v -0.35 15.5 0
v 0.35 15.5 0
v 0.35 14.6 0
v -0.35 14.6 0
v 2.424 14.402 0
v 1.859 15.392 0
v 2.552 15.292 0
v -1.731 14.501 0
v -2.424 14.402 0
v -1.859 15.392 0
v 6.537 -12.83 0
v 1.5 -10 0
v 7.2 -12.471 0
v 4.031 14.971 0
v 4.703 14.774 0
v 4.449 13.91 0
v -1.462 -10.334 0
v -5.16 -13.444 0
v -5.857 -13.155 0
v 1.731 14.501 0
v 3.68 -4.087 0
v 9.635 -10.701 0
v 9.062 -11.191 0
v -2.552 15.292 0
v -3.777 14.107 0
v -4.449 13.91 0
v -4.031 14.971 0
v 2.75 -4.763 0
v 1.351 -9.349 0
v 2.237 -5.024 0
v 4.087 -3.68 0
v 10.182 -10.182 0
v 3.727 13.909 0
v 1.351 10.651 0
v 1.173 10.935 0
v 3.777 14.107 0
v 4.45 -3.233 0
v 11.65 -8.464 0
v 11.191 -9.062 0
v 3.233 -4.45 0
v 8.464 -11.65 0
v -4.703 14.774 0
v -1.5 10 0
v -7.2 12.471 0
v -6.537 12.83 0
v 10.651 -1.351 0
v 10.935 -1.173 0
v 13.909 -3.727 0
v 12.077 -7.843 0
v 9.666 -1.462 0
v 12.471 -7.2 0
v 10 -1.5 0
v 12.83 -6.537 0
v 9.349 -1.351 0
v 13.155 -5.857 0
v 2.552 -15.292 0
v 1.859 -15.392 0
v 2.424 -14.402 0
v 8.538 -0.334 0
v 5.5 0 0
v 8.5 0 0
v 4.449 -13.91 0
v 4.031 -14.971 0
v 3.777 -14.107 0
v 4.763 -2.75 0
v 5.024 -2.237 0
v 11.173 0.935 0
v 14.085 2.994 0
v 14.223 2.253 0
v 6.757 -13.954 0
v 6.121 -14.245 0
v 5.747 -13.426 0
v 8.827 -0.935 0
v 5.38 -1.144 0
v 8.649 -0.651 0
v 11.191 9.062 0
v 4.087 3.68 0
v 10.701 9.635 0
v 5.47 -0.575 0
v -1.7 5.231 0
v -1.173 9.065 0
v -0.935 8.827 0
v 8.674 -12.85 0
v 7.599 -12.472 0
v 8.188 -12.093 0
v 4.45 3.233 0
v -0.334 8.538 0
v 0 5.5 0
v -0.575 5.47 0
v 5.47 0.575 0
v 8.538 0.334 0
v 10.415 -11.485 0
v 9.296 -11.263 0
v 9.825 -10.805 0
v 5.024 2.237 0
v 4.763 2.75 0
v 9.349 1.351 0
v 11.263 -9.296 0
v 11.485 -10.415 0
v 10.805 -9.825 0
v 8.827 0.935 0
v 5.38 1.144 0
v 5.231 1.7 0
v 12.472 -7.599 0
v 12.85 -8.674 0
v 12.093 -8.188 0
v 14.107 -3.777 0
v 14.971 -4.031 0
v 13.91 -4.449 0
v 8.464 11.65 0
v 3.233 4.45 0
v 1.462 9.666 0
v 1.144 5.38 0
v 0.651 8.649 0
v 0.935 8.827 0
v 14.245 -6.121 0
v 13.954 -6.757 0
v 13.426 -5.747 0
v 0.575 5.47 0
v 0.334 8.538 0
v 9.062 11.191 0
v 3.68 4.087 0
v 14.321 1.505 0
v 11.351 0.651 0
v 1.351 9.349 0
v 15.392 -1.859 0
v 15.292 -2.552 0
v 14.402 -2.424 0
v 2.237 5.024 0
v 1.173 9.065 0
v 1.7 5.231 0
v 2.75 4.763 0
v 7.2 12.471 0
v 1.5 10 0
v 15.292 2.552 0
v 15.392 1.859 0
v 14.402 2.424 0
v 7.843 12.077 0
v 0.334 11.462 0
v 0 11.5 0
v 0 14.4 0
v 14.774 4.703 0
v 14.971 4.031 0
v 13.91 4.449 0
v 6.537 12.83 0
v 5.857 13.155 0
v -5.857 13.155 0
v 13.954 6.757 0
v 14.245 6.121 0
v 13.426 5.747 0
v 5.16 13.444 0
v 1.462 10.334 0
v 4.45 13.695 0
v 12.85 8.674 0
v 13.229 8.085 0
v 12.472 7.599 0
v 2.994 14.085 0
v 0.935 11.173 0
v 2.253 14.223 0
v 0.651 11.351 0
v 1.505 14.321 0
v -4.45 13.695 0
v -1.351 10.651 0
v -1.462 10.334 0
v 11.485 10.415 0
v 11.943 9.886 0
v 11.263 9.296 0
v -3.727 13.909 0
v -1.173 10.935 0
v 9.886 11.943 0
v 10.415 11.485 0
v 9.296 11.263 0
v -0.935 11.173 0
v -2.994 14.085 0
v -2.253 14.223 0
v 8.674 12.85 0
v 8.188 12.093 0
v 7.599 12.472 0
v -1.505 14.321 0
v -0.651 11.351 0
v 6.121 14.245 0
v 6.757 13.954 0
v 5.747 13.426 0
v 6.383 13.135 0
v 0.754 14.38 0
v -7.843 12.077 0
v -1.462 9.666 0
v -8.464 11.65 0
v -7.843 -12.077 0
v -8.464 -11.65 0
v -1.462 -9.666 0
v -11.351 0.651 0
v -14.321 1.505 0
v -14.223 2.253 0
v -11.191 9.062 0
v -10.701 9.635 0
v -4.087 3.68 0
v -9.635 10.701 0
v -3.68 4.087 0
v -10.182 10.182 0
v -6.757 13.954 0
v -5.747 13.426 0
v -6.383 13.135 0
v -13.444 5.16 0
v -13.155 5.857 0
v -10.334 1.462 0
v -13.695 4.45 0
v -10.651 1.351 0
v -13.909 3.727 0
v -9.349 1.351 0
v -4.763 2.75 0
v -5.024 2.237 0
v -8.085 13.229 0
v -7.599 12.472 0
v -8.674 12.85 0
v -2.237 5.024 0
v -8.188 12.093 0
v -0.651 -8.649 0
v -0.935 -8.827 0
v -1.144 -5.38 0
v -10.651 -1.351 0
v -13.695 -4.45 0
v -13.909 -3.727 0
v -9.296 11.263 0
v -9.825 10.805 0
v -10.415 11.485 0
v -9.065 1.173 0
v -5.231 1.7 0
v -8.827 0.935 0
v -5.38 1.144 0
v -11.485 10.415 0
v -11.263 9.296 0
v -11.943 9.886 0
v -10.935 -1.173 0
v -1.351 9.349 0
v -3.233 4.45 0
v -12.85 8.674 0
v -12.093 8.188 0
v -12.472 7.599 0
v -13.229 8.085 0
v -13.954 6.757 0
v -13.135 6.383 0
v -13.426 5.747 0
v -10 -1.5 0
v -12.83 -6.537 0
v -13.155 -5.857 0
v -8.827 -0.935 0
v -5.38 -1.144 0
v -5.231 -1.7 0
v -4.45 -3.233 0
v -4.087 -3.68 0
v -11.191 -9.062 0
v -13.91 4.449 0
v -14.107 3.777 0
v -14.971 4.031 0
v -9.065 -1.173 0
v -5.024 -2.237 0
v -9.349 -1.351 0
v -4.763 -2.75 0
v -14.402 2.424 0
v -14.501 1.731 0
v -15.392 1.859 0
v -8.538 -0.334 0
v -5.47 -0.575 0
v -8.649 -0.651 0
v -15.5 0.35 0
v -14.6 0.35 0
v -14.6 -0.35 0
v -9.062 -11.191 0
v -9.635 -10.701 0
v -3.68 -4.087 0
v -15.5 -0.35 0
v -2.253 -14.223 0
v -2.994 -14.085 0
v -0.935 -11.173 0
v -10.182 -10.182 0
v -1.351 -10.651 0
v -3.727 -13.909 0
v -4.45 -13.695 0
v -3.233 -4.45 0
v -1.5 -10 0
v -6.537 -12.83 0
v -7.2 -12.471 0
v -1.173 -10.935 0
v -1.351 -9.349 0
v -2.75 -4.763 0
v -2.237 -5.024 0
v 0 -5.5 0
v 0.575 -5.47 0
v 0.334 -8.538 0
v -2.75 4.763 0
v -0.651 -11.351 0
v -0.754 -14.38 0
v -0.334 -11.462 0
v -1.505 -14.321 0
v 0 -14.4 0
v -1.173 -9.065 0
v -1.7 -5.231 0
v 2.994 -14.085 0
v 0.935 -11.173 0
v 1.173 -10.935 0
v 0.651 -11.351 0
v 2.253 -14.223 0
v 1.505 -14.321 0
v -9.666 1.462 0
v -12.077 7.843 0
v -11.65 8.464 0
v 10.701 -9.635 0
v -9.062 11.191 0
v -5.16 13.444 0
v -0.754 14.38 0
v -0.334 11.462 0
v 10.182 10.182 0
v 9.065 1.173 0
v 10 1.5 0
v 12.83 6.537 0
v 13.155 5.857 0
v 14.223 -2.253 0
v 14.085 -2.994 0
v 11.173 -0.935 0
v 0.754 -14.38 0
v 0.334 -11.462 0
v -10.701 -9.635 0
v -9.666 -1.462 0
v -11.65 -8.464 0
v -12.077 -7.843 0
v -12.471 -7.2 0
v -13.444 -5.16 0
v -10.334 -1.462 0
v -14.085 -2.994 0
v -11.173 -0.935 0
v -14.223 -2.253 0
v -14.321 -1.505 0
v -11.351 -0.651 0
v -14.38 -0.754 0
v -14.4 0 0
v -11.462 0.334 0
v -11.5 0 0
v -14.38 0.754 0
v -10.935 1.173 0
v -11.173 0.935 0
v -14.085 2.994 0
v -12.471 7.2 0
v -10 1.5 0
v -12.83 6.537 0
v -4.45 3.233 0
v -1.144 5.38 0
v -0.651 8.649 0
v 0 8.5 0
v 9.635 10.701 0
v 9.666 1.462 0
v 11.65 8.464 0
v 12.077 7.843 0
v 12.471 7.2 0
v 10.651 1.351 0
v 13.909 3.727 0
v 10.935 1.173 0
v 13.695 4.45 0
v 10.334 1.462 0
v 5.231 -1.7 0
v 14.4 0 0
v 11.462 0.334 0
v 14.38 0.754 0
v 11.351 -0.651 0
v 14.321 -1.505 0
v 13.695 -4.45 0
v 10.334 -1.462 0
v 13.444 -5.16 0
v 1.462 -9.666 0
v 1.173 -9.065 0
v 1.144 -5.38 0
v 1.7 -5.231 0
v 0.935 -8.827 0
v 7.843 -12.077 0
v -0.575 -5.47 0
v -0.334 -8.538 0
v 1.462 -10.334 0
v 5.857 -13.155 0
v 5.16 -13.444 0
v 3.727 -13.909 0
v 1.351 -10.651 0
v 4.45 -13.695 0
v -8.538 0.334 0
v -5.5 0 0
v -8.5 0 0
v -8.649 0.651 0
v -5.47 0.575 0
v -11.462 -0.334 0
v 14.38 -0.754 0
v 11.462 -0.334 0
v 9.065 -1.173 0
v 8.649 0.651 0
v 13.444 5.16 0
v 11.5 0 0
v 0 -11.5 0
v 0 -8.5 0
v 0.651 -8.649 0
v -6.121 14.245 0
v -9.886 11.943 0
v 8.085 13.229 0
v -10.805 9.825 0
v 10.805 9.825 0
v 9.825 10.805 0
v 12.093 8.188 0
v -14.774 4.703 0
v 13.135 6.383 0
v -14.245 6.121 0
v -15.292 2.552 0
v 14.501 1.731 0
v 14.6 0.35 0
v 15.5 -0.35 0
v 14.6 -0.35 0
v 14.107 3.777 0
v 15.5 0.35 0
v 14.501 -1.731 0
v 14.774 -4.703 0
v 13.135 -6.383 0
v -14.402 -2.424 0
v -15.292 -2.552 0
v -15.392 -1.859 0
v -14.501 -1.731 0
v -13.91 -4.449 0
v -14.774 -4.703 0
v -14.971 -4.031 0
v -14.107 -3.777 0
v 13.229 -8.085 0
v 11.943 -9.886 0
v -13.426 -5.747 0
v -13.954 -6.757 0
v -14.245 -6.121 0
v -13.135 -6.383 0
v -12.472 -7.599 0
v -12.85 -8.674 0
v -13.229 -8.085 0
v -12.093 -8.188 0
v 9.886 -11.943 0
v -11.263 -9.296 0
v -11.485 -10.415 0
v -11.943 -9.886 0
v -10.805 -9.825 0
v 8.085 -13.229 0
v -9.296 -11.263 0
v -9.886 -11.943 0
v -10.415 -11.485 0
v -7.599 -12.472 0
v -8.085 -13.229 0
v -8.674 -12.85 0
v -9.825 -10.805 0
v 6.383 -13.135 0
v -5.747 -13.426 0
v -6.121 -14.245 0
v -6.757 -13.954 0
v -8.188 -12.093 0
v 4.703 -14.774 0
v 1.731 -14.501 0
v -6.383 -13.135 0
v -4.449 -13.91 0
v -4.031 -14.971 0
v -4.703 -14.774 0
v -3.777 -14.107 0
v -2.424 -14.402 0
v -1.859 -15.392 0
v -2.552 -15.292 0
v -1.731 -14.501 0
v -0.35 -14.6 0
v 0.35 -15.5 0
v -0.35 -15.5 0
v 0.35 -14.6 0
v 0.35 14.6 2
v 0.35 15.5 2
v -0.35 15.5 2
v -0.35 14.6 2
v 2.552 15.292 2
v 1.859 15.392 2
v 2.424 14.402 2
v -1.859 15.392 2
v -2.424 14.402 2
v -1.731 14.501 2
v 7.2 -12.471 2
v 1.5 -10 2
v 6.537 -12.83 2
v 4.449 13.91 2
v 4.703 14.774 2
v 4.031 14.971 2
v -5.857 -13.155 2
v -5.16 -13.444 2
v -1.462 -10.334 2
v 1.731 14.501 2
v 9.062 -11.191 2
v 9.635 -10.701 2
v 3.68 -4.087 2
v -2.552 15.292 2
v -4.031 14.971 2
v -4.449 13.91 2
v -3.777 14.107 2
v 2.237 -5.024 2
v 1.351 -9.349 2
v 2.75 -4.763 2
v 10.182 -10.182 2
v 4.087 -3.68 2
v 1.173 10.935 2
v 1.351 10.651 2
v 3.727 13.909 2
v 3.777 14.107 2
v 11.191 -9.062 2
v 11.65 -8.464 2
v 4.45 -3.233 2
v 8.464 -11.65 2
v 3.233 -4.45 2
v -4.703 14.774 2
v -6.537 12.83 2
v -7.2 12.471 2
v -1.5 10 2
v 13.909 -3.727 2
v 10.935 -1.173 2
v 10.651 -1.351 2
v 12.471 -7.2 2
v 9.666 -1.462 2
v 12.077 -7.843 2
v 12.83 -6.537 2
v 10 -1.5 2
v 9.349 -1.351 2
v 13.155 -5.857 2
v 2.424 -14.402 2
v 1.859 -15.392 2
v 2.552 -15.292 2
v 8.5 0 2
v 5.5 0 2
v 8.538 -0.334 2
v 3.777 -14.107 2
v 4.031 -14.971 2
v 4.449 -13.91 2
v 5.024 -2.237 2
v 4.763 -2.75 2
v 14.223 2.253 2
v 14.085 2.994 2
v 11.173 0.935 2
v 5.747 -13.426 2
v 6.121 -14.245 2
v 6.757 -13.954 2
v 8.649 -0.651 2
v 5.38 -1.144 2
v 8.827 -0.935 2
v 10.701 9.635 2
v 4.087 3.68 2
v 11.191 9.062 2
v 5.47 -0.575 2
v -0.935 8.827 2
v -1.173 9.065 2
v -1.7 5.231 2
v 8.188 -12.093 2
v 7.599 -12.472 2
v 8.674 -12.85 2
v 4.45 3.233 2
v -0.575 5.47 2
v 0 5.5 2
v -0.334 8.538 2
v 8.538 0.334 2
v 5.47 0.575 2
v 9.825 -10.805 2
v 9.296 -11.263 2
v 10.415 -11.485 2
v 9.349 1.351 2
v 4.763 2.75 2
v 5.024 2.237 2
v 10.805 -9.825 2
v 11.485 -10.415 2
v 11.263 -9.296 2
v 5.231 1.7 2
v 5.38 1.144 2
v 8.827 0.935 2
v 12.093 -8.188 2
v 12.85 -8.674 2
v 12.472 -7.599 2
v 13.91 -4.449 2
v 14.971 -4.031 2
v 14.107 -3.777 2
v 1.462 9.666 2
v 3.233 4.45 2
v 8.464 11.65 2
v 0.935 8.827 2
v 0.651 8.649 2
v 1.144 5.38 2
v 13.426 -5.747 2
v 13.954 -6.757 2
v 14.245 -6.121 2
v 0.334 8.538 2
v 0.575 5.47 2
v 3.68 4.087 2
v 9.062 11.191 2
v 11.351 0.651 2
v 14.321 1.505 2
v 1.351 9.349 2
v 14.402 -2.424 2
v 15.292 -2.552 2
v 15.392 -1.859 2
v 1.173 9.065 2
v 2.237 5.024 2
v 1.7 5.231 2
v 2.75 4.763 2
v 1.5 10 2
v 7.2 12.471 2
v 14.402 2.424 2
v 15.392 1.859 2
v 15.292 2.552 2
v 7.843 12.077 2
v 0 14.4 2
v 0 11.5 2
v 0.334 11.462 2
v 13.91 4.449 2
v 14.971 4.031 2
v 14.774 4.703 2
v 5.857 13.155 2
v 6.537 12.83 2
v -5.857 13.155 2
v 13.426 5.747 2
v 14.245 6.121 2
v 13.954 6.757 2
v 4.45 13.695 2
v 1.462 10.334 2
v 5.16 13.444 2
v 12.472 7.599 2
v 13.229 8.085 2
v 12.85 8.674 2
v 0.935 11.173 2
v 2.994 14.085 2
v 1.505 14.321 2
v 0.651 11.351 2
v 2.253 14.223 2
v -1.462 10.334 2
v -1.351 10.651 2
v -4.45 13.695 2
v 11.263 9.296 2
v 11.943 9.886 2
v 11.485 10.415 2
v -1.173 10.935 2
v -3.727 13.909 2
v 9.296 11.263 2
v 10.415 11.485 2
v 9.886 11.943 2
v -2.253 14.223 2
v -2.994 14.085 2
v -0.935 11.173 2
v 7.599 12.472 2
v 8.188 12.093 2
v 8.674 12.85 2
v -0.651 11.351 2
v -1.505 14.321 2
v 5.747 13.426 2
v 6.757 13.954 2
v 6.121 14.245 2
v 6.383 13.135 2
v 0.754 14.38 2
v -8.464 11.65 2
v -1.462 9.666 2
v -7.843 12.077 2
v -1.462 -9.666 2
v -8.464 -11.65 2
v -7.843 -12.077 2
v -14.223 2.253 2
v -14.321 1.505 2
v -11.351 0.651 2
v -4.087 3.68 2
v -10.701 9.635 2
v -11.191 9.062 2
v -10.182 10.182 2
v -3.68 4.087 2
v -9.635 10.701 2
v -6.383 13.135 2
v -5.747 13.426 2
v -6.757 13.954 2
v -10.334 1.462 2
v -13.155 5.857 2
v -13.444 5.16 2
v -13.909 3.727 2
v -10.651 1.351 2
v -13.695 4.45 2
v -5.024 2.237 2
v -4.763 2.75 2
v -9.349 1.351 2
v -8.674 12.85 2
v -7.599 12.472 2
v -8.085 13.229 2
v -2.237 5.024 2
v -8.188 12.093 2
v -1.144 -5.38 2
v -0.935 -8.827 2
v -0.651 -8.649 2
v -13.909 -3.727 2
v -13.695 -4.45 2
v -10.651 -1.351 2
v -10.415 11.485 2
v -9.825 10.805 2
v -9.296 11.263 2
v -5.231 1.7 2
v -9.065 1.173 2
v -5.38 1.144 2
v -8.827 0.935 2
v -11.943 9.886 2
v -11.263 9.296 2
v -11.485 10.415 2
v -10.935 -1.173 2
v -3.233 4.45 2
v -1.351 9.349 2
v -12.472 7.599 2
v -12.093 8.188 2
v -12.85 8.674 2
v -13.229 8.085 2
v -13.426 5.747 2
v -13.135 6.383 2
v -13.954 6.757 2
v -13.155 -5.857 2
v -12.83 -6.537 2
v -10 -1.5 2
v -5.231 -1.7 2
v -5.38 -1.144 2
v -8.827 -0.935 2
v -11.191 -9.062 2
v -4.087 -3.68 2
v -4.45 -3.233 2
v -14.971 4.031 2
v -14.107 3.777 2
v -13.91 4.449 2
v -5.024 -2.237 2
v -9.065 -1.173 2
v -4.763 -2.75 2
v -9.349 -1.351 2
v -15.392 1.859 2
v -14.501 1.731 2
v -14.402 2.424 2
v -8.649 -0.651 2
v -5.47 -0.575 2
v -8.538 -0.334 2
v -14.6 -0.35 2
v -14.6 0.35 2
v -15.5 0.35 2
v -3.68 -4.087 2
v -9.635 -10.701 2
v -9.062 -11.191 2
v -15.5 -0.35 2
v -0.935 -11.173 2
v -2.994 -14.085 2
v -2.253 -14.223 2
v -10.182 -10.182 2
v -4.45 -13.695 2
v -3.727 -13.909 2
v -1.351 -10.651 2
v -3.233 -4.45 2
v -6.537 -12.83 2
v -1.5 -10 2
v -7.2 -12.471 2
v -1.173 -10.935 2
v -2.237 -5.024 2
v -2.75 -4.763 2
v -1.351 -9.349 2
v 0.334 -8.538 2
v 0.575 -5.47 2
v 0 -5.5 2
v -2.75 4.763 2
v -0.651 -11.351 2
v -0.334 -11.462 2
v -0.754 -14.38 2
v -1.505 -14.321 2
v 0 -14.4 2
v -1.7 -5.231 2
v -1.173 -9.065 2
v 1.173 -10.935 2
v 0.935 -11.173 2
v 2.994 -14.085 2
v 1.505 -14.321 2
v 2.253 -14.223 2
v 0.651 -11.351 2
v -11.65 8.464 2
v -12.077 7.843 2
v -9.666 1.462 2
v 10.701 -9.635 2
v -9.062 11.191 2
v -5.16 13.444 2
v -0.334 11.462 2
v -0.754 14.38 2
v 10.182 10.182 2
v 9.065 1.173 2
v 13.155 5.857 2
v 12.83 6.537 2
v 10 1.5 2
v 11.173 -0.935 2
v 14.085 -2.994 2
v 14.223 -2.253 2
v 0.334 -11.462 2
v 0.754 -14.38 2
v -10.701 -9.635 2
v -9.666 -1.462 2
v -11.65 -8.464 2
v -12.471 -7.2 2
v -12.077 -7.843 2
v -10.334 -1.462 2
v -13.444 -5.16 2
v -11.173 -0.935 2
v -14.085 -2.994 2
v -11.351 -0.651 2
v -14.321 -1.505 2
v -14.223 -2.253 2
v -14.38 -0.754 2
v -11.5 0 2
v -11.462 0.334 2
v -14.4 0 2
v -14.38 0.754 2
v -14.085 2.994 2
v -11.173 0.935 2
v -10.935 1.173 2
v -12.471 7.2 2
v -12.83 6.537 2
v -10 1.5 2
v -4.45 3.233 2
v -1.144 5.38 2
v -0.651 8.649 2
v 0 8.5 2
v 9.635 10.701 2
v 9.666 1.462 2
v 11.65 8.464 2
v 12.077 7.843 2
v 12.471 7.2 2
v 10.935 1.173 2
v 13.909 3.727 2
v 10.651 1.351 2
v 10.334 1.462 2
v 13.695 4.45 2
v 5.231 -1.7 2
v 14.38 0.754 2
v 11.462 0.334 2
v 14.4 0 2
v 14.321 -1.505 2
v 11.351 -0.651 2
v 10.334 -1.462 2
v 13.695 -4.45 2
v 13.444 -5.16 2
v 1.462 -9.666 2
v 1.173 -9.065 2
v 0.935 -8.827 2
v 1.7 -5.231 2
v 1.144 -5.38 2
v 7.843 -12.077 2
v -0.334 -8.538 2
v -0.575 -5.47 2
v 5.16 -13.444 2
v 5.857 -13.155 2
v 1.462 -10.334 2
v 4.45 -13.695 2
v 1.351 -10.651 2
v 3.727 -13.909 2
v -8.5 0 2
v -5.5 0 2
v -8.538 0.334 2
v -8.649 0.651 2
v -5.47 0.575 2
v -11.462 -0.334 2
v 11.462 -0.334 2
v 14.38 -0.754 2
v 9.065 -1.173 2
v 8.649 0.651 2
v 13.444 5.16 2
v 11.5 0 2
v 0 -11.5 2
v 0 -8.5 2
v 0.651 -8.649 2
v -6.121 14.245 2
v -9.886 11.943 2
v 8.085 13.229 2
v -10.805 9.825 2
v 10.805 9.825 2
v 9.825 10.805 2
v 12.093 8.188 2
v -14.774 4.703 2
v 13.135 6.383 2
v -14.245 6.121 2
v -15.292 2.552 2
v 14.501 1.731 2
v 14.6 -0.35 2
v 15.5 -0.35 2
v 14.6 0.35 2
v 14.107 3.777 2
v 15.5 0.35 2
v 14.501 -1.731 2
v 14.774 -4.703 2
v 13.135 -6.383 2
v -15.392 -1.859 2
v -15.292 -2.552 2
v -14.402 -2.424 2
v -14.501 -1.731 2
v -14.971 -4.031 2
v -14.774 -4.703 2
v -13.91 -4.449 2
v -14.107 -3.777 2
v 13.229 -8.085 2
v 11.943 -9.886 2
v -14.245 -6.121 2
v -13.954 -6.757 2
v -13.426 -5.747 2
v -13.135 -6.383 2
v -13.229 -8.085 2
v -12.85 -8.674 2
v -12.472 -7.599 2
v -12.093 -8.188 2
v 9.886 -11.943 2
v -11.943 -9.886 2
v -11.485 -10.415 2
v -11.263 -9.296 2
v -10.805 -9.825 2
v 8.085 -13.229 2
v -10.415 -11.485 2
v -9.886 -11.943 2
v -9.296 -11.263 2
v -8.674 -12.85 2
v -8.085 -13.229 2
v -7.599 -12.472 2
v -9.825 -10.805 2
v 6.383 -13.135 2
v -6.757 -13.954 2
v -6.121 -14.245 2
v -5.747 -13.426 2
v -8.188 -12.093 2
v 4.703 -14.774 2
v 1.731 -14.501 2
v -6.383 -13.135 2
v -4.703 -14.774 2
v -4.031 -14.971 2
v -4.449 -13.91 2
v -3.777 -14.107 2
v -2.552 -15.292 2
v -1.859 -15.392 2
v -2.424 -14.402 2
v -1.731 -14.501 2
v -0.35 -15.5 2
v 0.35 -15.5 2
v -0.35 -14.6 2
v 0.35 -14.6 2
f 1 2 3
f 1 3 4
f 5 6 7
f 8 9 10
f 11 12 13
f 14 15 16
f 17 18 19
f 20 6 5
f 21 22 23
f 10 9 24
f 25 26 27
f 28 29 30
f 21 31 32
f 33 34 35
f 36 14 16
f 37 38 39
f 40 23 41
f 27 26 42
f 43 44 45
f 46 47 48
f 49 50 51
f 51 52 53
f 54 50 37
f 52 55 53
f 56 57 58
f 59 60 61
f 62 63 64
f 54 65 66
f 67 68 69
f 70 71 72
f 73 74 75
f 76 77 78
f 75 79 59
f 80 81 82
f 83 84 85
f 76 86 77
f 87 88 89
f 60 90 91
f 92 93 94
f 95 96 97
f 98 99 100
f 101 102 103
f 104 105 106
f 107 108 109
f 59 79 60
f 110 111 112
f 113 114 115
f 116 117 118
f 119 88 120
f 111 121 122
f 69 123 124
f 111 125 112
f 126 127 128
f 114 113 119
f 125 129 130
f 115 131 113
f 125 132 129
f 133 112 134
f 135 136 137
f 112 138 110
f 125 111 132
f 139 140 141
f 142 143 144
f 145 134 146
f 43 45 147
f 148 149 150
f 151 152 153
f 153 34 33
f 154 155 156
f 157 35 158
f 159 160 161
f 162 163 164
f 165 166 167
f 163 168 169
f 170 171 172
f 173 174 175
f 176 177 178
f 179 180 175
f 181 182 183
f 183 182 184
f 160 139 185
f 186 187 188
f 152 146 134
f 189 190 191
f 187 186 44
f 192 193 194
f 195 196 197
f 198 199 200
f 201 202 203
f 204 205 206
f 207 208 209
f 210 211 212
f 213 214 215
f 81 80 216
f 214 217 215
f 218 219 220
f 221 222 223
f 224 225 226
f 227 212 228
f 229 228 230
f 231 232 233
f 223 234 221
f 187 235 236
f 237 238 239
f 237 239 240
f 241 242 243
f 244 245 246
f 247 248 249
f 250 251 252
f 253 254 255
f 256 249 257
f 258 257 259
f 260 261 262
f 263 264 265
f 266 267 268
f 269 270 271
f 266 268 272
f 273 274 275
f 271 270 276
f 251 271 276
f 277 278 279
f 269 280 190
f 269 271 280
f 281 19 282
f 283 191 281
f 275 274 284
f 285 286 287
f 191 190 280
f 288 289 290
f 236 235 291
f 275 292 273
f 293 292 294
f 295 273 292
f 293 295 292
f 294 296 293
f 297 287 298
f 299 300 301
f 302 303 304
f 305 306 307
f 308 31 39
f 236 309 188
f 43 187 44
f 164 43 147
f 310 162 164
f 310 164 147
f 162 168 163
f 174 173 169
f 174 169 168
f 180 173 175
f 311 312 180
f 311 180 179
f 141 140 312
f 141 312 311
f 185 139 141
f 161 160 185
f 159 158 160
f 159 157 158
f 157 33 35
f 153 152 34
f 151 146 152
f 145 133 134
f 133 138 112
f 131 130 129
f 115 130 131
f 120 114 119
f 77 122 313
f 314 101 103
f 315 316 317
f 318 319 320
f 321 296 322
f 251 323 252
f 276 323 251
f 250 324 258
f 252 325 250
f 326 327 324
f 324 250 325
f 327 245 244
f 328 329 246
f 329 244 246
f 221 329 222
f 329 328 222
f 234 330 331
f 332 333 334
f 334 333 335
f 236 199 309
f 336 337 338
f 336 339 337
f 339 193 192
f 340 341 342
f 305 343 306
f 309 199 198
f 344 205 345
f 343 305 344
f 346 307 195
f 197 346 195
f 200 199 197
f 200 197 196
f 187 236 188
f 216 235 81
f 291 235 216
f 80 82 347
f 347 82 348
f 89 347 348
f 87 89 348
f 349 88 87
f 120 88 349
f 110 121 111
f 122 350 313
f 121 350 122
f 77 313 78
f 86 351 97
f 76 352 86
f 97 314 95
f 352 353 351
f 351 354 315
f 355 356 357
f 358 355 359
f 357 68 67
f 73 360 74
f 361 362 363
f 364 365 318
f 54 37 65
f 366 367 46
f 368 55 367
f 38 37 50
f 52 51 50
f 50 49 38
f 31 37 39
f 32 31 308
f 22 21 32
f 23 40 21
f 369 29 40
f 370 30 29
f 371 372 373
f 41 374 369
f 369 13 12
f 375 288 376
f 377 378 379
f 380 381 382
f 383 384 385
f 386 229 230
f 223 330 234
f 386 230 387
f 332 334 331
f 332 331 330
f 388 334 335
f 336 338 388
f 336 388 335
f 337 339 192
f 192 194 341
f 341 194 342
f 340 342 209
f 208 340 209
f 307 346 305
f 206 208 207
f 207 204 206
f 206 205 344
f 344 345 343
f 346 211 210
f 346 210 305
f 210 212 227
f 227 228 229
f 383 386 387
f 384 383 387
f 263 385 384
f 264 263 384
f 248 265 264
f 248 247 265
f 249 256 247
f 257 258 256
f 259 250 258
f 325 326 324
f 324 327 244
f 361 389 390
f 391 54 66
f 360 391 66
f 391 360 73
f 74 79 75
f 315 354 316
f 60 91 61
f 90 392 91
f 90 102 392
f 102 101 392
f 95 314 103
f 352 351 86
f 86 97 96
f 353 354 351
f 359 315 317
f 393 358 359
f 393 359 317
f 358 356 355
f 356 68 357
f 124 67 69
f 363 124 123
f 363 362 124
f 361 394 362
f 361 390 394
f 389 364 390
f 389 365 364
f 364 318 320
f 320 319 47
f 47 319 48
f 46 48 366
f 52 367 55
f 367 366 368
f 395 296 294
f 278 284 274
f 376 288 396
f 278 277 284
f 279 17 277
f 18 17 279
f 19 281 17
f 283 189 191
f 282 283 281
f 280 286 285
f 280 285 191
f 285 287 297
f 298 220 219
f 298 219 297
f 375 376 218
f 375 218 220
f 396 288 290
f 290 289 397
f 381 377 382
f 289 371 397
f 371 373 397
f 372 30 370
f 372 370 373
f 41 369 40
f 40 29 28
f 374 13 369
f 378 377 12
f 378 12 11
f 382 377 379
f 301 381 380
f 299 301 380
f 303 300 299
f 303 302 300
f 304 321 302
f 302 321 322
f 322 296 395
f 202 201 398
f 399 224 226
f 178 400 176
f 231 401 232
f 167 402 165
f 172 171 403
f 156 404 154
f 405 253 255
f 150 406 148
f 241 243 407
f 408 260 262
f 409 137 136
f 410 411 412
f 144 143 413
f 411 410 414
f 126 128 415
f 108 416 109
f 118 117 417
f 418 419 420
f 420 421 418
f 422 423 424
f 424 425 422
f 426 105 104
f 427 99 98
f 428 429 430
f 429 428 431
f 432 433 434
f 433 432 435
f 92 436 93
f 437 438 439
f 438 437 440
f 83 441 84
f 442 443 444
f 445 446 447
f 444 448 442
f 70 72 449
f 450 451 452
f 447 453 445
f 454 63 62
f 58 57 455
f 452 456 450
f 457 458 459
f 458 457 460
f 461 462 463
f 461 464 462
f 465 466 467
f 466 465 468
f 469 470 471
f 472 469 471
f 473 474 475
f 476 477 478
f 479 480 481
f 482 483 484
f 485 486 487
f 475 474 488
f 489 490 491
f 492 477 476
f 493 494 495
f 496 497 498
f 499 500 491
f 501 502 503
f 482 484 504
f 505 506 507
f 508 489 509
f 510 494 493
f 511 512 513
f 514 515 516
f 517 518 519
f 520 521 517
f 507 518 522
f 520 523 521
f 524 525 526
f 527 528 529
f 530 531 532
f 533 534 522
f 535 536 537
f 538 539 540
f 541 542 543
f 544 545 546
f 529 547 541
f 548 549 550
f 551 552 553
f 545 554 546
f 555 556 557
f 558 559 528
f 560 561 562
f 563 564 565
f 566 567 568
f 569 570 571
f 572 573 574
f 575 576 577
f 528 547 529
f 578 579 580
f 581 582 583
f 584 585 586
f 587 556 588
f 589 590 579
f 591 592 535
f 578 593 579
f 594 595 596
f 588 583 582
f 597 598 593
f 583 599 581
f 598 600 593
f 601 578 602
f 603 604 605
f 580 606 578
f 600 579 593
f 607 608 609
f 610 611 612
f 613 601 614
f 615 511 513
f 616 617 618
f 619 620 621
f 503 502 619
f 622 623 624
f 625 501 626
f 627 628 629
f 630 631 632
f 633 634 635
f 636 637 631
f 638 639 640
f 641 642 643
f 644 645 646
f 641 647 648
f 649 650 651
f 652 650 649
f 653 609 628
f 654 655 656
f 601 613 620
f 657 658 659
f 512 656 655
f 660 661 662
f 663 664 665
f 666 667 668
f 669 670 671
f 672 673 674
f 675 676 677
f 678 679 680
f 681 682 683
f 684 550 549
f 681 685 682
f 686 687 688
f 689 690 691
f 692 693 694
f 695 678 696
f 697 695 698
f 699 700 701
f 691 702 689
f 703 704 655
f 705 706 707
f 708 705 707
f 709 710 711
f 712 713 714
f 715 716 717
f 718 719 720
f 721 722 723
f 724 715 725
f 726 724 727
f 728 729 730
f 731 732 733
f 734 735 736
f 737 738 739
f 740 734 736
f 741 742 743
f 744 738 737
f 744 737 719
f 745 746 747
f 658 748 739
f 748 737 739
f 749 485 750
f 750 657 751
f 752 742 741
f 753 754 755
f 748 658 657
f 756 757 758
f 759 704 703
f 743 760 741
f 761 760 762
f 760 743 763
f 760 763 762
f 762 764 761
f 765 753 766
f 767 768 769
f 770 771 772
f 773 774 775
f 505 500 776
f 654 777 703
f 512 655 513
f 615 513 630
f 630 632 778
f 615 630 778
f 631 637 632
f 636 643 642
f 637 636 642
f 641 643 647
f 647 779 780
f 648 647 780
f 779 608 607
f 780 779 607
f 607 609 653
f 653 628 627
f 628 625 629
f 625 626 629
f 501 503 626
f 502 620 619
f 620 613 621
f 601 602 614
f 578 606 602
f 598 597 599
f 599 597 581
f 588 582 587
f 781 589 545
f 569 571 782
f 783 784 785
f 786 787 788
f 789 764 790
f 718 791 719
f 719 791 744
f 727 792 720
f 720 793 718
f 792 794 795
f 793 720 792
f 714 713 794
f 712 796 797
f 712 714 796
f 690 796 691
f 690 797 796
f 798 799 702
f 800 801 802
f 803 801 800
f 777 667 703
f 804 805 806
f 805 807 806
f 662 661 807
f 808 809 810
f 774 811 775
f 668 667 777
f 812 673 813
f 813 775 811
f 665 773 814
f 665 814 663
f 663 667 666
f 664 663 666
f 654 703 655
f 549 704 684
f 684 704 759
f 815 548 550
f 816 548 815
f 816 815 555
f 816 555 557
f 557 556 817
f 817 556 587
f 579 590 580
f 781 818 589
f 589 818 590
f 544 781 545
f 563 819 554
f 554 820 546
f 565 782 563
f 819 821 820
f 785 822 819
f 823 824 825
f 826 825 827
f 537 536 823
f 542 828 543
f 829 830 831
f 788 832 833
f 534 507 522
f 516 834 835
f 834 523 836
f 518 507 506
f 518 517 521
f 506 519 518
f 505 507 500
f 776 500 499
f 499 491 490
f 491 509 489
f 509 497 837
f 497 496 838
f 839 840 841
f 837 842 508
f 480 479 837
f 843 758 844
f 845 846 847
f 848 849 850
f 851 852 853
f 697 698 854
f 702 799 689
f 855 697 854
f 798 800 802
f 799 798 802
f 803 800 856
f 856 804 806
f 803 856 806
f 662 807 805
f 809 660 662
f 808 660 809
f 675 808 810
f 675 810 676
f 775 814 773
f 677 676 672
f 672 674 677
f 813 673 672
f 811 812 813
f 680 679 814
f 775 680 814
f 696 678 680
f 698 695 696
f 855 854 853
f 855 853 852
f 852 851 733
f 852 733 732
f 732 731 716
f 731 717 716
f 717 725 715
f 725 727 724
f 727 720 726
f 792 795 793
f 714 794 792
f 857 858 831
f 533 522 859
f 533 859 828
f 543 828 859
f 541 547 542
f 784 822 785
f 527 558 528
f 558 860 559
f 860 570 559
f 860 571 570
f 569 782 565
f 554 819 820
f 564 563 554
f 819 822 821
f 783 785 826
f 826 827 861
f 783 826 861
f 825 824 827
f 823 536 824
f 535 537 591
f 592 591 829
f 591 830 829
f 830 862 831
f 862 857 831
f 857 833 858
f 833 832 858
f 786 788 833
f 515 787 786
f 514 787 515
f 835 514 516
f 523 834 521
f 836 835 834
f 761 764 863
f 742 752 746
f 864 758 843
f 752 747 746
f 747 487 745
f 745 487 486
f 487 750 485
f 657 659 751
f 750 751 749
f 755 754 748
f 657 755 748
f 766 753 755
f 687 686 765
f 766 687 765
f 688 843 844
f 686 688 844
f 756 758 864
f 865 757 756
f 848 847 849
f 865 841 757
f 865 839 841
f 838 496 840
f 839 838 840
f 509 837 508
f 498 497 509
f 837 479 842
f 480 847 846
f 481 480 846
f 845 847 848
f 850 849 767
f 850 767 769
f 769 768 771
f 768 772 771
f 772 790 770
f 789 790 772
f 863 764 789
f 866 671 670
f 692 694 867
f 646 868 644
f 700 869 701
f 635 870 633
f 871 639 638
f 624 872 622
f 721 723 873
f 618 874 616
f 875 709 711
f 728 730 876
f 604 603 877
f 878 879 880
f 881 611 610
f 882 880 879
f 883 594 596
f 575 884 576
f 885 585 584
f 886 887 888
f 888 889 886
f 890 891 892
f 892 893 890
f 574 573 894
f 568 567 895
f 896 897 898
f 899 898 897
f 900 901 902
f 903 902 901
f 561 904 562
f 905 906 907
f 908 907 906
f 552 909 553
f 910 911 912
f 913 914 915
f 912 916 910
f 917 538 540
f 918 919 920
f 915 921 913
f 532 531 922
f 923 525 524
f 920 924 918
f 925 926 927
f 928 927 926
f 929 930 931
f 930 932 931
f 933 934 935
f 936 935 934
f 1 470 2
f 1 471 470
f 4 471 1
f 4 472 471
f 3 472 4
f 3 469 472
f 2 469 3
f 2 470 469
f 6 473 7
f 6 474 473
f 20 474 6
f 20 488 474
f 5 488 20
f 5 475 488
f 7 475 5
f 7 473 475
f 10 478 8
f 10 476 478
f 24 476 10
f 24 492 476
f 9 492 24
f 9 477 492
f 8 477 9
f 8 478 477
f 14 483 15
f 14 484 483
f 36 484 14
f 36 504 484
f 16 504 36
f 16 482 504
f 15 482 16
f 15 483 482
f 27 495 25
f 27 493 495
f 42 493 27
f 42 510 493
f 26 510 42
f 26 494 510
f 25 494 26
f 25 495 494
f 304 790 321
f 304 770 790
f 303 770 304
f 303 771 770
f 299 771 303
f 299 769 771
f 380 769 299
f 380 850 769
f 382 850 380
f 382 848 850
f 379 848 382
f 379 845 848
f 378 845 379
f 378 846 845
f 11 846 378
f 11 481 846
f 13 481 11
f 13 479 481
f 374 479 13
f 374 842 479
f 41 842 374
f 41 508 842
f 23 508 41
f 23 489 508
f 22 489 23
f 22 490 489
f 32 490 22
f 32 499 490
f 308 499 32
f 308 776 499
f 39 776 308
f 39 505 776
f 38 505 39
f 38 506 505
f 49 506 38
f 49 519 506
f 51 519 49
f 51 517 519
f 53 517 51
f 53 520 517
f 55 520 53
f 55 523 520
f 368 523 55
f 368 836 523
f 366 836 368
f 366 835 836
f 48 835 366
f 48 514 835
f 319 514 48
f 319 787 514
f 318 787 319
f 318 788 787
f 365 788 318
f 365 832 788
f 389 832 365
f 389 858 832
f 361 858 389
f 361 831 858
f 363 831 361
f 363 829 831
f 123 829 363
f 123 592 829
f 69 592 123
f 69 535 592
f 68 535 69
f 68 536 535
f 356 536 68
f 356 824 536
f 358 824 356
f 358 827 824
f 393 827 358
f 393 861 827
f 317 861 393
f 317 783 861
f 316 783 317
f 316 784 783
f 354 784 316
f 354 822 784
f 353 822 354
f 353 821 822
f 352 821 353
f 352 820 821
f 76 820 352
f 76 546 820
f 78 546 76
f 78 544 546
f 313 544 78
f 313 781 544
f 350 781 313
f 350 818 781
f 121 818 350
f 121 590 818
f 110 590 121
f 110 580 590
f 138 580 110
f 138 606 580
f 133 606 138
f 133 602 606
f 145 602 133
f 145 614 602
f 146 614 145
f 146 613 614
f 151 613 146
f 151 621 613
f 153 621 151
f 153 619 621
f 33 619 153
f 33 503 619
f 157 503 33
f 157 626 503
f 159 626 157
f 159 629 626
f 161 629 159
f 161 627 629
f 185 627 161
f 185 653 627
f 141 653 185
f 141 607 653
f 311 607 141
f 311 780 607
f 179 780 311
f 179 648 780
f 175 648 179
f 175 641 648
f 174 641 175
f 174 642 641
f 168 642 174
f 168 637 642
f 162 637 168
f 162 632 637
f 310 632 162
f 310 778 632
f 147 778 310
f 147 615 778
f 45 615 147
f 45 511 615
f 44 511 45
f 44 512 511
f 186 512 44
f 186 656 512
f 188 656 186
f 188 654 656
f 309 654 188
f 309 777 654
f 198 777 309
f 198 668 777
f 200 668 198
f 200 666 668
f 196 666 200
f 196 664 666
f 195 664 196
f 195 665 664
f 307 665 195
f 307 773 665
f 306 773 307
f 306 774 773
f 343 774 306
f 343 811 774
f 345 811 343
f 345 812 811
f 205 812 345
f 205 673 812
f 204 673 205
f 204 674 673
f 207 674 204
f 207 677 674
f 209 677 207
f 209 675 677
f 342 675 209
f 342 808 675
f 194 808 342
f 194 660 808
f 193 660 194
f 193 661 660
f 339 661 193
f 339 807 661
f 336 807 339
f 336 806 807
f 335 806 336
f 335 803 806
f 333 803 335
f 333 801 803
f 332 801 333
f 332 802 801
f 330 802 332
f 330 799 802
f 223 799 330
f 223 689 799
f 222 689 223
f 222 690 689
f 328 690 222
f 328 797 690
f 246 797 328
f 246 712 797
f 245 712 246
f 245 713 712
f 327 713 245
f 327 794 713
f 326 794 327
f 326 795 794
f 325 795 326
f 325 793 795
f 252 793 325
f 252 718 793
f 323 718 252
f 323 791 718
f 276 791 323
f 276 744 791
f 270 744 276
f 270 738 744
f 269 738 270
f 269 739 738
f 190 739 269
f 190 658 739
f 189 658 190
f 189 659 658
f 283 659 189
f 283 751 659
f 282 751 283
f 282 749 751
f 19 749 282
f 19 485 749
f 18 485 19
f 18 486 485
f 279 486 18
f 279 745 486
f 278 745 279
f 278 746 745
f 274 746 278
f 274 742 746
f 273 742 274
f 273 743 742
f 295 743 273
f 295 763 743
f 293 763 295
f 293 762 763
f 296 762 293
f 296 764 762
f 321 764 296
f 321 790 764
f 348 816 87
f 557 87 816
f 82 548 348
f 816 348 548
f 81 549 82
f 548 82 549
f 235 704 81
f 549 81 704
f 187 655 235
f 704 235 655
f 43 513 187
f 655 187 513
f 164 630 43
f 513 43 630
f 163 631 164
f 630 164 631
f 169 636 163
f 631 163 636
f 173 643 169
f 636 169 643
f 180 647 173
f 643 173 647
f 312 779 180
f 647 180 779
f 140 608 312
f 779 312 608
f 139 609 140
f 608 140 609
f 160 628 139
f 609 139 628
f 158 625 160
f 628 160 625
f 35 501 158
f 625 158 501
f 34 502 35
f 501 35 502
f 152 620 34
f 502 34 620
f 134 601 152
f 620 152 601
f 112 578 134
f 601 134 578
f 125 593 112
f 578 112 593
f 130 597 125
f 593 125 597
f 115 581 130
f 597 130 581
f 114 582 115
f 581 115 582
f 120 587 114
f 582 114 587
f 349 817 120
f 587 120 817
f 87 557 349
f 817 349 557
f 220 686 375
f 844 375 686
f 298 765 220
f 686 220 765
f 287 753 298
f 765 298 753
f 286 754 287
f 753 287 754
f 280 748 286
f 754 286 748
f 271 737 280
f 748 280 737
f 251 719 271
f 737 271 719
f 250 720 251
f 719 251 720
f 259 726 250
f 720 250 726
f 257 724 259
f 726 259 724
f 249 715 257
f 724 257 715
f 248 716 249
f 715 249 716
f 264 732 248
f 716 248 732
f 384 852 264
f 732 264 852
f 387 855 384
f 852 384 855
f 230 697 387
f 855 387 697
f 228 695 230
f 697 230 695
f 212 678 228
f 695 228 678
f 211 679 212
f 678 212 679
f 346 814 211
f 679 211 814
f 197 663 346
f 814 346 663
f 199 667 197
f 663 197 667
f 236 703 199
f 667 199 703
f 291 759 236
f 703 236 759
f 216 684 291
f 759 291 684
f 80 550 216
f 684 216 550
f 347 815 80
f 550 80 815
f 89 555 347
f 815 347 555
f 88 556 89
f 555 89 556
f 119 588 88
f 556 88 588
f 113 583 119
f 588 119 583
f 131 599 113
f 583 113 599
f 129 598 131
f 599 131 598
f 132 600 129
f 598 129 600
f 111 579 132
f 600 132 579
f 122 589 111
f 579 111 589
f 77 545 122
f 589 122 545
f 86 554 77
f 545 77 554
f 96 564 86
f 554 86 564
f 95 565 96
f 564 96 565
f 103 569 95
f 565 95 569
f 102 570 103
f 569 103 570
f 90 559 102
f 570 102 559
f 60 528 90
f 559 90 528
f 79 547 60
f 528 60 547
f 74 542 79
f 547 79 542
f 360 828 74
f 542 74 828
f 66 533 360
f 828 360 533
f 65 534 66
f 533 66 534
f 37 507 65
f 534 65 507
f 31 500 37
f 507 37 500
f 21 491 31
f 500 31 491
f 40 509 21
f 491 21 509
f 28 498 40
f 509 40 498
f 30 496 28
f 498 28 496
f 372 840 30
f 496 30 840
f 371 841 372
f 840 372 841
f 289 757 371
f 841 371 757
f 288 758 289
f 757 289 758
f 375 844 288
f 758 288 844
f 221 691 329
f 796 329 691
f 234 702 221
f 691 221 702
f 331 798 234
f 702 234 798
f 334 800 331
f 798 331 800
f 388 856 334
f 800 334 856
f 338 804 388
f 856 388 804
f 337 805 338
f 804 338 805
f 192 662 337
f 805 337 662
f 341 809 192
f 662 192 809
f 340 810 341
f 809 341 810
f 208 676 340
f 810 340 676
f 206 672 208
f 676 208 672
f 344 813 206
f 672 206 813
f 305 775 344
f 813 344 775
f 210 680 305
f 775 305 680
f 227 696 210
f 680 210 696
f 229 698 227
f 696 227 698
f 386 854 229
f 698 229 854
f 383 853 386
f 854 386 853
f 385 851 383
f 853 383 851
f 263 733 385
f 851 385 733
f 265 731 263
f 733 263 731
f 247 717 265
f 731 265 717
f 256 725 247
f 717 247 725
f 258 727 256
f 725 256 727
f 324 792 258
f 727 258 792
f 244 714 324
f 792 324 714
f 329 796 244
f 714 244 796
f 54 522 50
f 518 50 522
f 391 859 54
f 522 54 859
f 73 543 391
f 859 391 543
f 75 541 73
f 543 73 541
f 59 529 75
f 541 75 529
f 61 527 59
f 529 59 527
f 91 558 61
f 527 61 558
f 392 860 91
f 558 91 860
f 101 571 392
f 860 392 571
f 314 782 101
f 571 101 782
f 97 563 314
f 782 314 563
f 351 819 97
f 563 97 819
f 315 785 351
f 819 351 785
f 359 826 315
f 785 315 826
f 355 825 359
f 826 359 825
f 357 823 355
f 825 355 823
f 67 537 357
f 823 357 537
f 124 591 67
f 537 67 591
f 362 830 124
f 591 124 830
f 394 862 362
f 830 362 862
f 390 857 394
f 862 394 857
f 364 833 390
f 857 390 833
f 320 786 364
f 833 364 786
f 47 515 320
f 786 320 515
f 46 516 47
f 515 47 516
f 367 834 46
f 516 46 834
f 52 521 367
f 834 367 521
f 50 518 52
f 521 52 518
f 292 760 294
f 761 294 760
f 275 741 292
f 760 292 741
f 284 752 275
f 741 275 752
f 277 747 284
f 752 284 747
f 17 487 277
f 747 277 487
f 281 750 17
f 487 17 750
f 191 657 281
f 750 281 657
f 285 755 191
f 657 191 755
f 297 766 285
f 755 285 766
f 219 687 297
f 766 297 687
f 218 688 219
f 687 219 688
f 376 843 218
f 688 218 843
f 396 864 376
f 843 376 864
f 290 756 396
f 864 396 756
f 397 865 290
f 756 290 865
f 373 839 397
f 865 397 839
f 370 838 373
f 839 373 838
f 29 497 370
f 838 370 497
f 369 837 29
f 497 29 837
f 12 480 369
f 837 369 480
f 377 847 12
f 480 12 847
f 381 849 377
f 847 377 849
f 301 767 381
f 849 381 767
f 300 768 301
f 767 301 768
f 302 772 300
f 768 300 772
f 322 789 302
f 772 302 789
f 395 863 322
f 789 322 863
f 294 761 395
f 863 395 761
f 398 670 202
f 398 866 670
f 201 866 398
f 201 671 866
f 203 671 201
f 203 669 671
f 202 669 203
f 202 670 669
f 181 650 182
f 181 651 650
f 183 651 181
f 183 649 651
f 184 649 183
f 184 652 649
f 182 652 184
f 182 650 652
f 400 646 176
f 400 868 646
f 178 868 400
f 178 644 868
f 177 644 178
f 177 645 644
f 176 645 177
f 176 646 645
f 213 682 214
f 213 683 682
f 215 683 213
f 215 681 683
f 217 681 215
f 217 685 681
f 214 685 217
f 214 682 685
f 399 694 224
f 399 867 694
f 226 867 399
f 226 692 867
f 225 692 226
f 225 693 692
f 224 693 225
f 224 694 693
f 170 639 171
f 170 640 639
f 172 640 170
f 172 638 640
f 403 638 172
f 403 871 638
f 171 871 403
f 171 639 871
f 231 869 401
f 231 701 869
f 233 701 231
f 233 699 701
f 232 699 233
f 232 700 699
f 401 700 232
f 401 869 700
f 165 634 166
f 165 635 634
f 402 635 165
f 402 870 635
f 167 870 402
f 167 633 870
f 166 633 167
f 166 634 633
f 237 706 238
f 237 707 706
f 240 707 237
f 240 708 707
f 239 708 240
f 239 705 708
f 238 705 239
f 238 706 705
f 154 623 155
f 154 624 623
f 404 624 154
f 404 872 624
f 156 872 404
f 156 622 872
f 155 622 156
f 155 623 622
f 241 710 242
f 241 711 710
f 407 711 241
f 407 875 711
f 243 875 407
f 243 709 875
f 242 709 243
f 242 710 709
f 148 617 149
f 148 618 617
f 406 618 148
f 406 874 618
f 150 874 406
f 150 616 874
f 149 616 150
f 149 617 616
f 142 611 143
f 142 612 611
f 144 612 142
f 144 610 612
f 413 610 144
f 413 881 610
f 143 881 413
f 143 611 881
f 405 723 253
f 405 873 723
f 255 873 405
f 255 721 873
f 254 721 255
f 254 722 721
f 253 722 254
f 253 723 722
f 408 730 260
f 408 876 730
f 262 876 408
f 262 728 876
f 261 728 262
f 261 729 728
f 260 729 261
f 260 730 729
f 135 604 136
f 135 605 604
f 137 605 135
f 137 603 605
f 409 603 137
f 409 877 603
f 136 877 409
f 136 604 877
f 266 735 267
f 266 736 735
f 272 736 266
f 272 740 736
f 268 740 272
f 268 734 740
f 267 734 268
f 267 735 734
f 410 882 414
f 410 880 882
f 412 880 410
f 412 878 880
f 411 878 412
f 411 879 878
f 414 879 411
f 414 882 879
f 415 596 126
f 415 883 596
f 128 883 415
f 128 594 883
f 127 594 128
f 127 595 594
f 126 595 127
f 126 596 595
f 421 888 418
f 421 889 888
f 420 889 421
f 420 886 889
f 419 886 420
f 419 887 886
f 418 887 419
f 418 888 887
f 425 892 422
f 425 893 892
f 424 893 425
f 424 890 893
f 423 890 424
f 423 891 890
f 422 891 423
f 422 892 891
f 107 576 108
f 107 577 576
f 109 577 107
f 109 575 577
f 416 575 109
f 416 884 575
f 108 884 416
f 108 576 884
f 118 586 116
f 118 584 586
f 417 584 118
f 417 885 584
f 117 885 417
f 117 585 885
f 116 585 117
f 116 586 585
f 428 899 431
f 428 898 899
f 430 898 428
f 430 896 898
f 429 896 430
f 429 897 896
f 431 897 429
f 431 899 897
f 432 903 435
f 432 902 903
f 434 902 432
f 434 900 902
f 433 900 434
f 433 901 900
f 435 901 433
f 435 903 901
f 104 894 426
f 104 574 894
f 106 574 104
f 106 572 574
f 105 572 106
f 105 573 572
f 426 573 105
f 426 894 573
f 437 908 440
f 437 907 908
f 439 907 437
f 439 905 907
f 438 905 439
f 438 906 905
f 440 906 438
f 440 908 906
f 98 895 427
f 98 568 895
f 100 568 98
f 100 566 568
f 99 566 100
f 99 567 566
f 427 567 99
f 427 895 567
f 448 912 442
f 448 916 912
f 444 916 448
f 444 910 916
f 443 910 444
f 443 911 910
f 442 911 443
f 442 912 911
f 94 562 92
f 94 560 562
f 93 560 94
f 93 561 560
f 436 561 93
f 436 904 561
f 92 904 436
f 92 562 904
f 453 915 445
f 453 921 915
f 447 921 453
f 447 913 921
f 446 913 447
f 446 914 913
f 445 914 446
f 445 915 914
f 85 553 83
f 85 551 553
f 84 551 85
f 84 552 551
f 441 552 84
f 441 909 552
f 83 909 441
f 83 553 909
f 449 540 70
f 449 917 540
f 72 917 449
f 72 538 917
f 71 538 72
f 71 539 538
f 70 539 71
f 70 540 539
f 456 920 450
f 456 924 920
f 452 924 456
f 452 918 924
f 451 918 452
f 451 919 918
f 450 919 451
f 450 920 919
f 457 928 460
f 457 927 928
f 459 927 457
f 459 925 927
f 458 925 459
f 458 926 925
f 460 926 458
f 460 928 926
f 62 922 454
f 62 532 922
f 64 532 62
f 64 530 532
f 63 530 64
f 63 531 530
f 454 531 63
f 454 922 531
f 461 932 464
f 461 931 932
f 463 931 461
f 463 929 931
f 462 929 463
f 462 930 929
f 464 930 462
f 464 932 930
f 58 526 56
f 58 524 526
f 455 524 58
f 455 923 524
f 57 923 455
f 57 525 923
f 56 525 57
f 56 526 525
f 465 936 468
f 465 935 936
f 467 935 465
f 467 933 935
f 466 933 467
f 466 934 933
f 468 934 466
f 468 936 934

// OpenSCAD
// part_id: b2
// name: B2 gear ring
// source_drawing_ids: DRW-002
// units: mm
// revision: 0.1
// SPDX-License-Identifier: MIT

module b2_gear_2d(outer_d = 31.0, root_d = 28.8, tooth_count = 44,
                  center_d = 11.0, rivet_d = 3.0, rivet_pitch = 20.0) {
    difference() {
        union() {
            circle(d = root_d, $fn = 120);
            for (i = [0 : tooth_count - 1])
                rotate(i * 360 / tooth_count)
                    translate([outer_d / 2 - 0.45, 0])
                        square([0.9, 0.7], center = true);
        }

        circle(d = center_d, $fn = 60);
        for (a = [0, 90, 180, 270])
            rotate(a) translate([rivet_pitch / 2, 0]) circle(d = rivet_d, $fn = 28);
    }
}

module part_b2(thickness = 2.0) {
    linear_extrude(height = thickness)
        b2_gear_2d();
}

// ---- "main guard" ----
// Default to previewing when opened directly:
if (is_undef(__LIB_MODE__)) {
    part_b2();
}
